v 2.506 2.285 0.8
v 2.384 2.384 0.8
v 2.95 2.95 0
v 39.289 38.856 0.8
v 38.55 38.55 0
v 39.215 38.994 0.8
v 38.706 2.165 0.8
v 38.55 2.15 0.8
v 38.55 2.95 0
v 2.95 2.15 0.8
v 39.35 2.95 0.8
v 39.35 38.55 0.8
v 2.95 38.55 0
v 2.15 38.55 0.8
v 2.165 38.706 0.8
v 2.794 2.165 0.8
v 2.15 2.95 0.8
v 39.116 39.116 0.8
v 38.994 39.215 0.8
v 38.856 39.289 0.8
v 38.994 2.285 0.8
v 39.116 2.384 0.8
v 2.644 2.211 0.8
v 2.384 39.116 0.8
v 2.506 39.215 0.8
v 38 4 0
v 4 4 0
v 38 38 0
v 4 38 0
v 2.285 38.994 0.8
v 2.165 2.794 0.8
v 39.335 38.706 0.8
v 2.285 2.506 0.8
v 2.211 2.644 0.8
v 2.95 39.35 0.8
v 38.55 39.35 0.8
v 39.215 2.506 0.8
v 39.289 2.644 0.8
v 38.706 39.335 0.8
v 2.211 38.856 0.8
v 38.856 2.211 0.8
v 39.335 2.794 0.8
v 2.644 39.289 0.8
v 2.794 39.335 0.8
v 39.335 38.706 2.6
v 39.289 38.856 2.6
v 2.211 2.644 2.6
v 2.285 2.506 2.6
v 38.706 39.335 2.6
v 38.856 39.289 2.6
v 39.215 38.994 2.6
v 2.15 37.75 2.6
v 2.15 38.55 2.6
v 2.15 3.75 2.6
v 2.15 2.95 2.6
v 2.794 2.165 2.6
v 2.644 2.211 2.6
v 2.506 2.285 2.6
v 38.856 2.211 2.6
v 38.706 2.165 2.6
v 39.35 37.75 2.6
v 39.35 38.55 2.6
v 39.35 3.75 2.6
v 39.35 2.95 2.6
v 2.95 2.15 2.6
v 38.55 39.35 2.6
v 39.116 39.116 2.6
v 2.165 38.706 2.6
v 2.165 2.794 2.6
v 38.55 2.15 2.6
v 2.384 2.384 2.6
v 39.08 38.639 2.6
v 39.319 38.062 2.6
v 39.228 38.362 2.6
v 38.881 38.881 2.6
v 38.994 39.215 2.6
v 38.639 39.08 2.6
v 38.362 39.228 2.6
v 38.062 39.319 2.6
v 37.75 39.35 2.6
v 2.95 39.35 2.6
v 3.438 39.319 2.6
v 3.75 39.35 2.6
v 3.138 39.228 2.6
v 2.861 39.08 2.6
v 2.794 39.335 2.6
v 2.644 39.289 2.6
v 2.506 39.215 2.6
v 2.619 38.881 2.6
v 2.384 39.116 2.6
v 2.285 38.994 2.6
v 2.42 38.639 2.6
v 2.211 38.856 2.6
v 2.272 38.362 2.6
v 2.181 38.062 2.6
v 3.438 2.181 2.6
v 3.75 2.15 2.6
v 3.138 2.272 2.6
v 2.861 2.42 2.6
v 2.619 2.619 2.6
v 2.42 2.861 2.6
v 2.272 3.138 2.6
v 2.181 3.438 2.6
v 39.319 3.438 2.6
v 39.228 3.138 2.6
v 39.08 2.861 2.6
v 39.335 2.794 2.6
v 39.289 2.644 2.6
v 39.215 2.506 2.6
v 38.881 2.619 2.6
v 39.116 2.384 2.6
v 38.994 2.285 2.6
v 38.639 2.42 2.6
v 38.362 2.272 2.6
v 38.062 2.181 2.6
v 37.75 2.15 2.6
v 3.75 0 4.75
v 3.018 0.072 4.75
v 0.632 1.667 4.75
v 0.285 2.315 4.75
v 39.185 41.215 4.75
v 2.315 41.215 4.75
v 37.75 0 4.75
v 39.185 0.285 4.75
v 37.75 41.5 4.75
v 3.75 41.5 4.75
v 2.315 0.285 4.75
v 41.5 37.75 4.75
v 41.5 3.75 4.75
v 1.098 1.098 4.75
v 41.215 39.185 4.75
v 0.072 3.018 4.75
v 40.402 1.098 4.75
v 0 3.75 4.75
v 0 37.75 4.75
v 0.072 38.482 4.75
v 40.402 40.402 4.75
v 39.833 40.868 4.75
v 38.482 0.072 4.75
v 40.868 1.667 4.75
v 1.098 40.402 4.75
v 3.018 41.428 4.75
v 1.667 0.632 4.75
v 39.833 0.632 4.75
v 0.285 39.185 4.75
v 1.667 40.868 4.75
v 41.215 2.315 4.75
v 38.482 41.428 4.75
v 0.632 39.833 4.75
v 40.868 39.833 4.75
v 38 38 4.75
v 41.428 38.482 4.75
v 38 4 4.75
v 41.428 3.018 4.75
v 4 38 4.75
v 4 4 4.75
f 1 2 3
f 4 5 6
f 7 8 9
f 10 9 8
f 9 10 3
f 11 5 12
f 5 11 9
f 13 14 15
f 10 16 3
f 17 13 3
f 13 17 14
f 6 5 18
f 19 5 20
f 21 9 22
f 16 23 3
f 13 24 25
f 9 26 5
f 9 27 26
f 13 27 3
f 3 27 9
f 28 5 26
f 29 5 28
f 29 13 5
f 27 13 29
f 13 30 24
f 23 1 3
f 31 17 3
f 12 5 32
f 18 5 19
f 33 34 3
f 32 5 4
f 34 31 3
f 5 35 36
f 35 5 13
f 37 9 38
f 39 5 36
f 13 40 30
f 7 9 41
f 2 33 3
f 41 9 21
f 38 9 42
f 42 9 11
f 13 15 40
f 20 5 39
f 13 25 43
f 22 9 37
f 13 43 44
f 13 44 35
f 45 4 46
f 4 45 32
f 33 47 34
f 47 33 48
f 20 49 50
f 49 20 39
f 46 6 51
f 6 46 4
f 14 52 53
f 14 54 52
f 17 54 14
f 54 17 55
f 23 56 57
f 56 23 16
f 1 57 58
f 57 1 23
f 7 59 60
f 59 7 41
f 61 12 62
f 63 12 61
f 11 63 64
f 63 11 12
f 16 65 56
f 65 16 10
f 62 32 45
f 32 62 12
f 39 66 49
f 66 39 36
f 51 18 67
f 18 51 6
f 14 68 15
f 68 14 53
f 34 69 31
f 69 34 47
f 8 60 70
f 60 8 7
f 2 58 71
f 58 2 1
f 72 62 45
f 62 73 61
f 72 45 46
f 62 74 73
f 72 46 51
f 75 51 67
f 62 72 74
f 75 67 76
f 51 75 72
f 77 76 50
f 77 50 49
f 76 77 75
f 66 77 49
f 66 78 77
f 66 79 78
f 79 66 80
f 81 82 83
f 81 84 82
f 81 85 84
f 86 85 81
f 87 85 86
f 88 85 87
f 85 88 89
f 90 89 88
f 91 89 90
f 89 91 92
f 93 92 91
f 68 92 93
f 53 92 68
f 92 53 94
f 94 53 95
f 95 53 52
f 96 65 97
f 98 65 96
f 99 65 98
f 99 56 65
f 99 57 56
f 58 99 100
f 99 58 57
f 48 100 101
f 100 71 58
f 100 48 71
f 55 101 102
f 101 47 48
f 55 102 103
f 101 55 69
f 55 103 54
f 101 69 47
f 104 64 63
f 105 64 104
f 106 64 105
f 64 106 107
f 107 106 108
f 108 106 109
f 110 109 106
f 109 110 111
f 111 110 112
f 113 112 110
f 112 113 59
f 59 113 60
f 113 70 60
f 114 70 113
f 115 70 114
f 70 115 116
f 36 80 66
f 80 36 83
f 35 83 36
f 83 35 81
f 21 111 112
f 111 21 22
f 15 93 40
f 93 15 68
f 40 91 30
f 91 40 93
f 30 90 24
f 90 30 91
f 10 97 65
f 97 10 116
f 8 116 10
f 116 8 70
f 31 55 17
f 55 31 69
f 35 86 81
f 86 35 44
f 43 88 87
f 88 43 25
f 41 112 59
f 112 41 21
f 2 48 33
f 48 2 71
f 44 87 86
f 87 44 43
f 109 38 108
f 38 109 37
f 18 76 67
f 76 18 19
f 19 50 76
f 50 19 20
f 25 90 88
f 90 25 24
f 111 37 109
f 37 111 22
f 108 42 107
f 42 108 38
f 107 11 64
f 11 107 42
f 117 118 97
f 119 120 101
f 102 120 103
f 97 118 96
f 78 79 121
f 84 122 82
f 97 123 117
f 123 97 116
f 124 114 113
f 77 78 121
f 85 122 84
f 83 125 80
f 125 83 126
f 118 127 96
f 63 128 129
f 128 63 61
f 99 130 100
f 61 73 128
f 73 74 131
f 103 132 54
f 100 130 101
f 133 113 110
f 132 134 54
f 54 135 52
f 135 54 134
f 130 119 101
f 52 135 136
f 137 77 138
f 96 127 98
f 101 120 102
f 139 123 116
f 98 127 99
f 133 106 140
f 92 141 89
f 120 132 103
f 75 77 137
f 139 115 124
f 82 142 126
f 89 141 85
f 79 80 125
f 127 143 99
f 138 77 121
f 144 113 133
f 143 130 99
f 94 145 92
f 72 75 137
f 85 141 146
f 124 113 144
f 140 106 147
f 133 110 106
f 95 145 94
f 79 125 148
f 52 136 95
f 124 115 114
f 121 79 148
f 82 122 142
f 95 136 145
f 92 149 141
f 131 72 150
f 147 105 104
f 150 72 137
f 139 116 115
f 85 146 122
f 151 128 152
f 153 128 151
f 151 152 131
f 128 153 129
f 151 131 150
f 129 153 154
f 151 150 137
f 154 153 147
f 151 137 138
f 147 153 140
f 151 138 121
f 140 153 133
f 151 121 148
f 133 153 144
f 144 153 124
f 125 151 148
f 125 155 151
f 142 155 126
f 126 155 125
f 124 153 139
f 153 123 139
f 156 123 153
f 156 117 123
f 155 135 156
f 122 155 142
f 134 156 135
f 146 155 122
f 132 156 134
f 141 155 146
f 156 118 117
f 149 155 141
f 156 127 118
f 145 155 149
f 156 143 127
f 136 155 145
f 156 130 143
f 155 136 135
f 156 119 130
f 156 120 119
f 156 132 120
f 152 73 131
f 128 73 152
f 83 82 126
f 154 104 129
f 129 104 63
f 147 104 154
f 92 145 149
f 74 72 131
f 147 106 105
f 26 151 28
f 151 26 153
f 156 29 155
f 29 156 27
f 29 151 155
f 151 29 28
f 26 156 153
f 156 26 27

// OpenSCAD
$fn = 32;

topGap = 2.15;
midGap = 1.80;
bottomGap = 0.80;
width = 35.6 + bottomGap * 2 + topGap * 2;

difference() {
    union(){
        hull() {
            z = bottomGap/2;
            adjust = topGap+0.8;
            translate ([adjust, adjust, z]) cylinder(bottomGap, 0, bottomGap, center = true);
            translate ([adjust,width-adjust, z]) cylinder(bottomGap, 0, bottomGap, center = true);
            translate ([width-adjust,width-adjust, z]) cylinder(bottomGap, 0, bottomGap, center = true);
            translate ([width-adjust,adjust, z]) cylinder(bottomGap, 0, bottomGap, center = true);
        }

        hull() {
            z = bottomGap+midGap/2;
            adjust = topGap + 0.8;
            translate ([adjust, adjust,z]) cylinder(midGap, 0.8, 0.8, center = true);
            translate ([adjust,width-adjust,z]) cylinder(midGap, 0.8, 0.8, center = true);
            translate ([width-adjust,width-adjust,z]) cylinder(midGap, 0.8, 0.8, center = true);
            translate ([width-adjust,adjust,z]) cylinder(midGap, 0.8, 0.8, center = true);
        }

        hull() {
            z = bottomGap+midGap+ topGap/2;            
            r1 = 7.5/2;
            r2 = r1 - topGap;
            adjust = 7.5/2;
            translate ([adjust, adjust,z]) cylinder(topGap, r2, r1, center = true);
            translate ([adjust,width-adjust,z]) cylinder(topGap, r2, r1, center = true);
            translate ([width-adjust,width-adjust,z]) cylinder(topGap, r2, r1, center = true);
            translate ([width-adjust,adjust,z]) cylinder(topGap, r2, r1, center = true);
        }
    };
    translate([4, 4, 0]) cube([34,34,10]);

}
